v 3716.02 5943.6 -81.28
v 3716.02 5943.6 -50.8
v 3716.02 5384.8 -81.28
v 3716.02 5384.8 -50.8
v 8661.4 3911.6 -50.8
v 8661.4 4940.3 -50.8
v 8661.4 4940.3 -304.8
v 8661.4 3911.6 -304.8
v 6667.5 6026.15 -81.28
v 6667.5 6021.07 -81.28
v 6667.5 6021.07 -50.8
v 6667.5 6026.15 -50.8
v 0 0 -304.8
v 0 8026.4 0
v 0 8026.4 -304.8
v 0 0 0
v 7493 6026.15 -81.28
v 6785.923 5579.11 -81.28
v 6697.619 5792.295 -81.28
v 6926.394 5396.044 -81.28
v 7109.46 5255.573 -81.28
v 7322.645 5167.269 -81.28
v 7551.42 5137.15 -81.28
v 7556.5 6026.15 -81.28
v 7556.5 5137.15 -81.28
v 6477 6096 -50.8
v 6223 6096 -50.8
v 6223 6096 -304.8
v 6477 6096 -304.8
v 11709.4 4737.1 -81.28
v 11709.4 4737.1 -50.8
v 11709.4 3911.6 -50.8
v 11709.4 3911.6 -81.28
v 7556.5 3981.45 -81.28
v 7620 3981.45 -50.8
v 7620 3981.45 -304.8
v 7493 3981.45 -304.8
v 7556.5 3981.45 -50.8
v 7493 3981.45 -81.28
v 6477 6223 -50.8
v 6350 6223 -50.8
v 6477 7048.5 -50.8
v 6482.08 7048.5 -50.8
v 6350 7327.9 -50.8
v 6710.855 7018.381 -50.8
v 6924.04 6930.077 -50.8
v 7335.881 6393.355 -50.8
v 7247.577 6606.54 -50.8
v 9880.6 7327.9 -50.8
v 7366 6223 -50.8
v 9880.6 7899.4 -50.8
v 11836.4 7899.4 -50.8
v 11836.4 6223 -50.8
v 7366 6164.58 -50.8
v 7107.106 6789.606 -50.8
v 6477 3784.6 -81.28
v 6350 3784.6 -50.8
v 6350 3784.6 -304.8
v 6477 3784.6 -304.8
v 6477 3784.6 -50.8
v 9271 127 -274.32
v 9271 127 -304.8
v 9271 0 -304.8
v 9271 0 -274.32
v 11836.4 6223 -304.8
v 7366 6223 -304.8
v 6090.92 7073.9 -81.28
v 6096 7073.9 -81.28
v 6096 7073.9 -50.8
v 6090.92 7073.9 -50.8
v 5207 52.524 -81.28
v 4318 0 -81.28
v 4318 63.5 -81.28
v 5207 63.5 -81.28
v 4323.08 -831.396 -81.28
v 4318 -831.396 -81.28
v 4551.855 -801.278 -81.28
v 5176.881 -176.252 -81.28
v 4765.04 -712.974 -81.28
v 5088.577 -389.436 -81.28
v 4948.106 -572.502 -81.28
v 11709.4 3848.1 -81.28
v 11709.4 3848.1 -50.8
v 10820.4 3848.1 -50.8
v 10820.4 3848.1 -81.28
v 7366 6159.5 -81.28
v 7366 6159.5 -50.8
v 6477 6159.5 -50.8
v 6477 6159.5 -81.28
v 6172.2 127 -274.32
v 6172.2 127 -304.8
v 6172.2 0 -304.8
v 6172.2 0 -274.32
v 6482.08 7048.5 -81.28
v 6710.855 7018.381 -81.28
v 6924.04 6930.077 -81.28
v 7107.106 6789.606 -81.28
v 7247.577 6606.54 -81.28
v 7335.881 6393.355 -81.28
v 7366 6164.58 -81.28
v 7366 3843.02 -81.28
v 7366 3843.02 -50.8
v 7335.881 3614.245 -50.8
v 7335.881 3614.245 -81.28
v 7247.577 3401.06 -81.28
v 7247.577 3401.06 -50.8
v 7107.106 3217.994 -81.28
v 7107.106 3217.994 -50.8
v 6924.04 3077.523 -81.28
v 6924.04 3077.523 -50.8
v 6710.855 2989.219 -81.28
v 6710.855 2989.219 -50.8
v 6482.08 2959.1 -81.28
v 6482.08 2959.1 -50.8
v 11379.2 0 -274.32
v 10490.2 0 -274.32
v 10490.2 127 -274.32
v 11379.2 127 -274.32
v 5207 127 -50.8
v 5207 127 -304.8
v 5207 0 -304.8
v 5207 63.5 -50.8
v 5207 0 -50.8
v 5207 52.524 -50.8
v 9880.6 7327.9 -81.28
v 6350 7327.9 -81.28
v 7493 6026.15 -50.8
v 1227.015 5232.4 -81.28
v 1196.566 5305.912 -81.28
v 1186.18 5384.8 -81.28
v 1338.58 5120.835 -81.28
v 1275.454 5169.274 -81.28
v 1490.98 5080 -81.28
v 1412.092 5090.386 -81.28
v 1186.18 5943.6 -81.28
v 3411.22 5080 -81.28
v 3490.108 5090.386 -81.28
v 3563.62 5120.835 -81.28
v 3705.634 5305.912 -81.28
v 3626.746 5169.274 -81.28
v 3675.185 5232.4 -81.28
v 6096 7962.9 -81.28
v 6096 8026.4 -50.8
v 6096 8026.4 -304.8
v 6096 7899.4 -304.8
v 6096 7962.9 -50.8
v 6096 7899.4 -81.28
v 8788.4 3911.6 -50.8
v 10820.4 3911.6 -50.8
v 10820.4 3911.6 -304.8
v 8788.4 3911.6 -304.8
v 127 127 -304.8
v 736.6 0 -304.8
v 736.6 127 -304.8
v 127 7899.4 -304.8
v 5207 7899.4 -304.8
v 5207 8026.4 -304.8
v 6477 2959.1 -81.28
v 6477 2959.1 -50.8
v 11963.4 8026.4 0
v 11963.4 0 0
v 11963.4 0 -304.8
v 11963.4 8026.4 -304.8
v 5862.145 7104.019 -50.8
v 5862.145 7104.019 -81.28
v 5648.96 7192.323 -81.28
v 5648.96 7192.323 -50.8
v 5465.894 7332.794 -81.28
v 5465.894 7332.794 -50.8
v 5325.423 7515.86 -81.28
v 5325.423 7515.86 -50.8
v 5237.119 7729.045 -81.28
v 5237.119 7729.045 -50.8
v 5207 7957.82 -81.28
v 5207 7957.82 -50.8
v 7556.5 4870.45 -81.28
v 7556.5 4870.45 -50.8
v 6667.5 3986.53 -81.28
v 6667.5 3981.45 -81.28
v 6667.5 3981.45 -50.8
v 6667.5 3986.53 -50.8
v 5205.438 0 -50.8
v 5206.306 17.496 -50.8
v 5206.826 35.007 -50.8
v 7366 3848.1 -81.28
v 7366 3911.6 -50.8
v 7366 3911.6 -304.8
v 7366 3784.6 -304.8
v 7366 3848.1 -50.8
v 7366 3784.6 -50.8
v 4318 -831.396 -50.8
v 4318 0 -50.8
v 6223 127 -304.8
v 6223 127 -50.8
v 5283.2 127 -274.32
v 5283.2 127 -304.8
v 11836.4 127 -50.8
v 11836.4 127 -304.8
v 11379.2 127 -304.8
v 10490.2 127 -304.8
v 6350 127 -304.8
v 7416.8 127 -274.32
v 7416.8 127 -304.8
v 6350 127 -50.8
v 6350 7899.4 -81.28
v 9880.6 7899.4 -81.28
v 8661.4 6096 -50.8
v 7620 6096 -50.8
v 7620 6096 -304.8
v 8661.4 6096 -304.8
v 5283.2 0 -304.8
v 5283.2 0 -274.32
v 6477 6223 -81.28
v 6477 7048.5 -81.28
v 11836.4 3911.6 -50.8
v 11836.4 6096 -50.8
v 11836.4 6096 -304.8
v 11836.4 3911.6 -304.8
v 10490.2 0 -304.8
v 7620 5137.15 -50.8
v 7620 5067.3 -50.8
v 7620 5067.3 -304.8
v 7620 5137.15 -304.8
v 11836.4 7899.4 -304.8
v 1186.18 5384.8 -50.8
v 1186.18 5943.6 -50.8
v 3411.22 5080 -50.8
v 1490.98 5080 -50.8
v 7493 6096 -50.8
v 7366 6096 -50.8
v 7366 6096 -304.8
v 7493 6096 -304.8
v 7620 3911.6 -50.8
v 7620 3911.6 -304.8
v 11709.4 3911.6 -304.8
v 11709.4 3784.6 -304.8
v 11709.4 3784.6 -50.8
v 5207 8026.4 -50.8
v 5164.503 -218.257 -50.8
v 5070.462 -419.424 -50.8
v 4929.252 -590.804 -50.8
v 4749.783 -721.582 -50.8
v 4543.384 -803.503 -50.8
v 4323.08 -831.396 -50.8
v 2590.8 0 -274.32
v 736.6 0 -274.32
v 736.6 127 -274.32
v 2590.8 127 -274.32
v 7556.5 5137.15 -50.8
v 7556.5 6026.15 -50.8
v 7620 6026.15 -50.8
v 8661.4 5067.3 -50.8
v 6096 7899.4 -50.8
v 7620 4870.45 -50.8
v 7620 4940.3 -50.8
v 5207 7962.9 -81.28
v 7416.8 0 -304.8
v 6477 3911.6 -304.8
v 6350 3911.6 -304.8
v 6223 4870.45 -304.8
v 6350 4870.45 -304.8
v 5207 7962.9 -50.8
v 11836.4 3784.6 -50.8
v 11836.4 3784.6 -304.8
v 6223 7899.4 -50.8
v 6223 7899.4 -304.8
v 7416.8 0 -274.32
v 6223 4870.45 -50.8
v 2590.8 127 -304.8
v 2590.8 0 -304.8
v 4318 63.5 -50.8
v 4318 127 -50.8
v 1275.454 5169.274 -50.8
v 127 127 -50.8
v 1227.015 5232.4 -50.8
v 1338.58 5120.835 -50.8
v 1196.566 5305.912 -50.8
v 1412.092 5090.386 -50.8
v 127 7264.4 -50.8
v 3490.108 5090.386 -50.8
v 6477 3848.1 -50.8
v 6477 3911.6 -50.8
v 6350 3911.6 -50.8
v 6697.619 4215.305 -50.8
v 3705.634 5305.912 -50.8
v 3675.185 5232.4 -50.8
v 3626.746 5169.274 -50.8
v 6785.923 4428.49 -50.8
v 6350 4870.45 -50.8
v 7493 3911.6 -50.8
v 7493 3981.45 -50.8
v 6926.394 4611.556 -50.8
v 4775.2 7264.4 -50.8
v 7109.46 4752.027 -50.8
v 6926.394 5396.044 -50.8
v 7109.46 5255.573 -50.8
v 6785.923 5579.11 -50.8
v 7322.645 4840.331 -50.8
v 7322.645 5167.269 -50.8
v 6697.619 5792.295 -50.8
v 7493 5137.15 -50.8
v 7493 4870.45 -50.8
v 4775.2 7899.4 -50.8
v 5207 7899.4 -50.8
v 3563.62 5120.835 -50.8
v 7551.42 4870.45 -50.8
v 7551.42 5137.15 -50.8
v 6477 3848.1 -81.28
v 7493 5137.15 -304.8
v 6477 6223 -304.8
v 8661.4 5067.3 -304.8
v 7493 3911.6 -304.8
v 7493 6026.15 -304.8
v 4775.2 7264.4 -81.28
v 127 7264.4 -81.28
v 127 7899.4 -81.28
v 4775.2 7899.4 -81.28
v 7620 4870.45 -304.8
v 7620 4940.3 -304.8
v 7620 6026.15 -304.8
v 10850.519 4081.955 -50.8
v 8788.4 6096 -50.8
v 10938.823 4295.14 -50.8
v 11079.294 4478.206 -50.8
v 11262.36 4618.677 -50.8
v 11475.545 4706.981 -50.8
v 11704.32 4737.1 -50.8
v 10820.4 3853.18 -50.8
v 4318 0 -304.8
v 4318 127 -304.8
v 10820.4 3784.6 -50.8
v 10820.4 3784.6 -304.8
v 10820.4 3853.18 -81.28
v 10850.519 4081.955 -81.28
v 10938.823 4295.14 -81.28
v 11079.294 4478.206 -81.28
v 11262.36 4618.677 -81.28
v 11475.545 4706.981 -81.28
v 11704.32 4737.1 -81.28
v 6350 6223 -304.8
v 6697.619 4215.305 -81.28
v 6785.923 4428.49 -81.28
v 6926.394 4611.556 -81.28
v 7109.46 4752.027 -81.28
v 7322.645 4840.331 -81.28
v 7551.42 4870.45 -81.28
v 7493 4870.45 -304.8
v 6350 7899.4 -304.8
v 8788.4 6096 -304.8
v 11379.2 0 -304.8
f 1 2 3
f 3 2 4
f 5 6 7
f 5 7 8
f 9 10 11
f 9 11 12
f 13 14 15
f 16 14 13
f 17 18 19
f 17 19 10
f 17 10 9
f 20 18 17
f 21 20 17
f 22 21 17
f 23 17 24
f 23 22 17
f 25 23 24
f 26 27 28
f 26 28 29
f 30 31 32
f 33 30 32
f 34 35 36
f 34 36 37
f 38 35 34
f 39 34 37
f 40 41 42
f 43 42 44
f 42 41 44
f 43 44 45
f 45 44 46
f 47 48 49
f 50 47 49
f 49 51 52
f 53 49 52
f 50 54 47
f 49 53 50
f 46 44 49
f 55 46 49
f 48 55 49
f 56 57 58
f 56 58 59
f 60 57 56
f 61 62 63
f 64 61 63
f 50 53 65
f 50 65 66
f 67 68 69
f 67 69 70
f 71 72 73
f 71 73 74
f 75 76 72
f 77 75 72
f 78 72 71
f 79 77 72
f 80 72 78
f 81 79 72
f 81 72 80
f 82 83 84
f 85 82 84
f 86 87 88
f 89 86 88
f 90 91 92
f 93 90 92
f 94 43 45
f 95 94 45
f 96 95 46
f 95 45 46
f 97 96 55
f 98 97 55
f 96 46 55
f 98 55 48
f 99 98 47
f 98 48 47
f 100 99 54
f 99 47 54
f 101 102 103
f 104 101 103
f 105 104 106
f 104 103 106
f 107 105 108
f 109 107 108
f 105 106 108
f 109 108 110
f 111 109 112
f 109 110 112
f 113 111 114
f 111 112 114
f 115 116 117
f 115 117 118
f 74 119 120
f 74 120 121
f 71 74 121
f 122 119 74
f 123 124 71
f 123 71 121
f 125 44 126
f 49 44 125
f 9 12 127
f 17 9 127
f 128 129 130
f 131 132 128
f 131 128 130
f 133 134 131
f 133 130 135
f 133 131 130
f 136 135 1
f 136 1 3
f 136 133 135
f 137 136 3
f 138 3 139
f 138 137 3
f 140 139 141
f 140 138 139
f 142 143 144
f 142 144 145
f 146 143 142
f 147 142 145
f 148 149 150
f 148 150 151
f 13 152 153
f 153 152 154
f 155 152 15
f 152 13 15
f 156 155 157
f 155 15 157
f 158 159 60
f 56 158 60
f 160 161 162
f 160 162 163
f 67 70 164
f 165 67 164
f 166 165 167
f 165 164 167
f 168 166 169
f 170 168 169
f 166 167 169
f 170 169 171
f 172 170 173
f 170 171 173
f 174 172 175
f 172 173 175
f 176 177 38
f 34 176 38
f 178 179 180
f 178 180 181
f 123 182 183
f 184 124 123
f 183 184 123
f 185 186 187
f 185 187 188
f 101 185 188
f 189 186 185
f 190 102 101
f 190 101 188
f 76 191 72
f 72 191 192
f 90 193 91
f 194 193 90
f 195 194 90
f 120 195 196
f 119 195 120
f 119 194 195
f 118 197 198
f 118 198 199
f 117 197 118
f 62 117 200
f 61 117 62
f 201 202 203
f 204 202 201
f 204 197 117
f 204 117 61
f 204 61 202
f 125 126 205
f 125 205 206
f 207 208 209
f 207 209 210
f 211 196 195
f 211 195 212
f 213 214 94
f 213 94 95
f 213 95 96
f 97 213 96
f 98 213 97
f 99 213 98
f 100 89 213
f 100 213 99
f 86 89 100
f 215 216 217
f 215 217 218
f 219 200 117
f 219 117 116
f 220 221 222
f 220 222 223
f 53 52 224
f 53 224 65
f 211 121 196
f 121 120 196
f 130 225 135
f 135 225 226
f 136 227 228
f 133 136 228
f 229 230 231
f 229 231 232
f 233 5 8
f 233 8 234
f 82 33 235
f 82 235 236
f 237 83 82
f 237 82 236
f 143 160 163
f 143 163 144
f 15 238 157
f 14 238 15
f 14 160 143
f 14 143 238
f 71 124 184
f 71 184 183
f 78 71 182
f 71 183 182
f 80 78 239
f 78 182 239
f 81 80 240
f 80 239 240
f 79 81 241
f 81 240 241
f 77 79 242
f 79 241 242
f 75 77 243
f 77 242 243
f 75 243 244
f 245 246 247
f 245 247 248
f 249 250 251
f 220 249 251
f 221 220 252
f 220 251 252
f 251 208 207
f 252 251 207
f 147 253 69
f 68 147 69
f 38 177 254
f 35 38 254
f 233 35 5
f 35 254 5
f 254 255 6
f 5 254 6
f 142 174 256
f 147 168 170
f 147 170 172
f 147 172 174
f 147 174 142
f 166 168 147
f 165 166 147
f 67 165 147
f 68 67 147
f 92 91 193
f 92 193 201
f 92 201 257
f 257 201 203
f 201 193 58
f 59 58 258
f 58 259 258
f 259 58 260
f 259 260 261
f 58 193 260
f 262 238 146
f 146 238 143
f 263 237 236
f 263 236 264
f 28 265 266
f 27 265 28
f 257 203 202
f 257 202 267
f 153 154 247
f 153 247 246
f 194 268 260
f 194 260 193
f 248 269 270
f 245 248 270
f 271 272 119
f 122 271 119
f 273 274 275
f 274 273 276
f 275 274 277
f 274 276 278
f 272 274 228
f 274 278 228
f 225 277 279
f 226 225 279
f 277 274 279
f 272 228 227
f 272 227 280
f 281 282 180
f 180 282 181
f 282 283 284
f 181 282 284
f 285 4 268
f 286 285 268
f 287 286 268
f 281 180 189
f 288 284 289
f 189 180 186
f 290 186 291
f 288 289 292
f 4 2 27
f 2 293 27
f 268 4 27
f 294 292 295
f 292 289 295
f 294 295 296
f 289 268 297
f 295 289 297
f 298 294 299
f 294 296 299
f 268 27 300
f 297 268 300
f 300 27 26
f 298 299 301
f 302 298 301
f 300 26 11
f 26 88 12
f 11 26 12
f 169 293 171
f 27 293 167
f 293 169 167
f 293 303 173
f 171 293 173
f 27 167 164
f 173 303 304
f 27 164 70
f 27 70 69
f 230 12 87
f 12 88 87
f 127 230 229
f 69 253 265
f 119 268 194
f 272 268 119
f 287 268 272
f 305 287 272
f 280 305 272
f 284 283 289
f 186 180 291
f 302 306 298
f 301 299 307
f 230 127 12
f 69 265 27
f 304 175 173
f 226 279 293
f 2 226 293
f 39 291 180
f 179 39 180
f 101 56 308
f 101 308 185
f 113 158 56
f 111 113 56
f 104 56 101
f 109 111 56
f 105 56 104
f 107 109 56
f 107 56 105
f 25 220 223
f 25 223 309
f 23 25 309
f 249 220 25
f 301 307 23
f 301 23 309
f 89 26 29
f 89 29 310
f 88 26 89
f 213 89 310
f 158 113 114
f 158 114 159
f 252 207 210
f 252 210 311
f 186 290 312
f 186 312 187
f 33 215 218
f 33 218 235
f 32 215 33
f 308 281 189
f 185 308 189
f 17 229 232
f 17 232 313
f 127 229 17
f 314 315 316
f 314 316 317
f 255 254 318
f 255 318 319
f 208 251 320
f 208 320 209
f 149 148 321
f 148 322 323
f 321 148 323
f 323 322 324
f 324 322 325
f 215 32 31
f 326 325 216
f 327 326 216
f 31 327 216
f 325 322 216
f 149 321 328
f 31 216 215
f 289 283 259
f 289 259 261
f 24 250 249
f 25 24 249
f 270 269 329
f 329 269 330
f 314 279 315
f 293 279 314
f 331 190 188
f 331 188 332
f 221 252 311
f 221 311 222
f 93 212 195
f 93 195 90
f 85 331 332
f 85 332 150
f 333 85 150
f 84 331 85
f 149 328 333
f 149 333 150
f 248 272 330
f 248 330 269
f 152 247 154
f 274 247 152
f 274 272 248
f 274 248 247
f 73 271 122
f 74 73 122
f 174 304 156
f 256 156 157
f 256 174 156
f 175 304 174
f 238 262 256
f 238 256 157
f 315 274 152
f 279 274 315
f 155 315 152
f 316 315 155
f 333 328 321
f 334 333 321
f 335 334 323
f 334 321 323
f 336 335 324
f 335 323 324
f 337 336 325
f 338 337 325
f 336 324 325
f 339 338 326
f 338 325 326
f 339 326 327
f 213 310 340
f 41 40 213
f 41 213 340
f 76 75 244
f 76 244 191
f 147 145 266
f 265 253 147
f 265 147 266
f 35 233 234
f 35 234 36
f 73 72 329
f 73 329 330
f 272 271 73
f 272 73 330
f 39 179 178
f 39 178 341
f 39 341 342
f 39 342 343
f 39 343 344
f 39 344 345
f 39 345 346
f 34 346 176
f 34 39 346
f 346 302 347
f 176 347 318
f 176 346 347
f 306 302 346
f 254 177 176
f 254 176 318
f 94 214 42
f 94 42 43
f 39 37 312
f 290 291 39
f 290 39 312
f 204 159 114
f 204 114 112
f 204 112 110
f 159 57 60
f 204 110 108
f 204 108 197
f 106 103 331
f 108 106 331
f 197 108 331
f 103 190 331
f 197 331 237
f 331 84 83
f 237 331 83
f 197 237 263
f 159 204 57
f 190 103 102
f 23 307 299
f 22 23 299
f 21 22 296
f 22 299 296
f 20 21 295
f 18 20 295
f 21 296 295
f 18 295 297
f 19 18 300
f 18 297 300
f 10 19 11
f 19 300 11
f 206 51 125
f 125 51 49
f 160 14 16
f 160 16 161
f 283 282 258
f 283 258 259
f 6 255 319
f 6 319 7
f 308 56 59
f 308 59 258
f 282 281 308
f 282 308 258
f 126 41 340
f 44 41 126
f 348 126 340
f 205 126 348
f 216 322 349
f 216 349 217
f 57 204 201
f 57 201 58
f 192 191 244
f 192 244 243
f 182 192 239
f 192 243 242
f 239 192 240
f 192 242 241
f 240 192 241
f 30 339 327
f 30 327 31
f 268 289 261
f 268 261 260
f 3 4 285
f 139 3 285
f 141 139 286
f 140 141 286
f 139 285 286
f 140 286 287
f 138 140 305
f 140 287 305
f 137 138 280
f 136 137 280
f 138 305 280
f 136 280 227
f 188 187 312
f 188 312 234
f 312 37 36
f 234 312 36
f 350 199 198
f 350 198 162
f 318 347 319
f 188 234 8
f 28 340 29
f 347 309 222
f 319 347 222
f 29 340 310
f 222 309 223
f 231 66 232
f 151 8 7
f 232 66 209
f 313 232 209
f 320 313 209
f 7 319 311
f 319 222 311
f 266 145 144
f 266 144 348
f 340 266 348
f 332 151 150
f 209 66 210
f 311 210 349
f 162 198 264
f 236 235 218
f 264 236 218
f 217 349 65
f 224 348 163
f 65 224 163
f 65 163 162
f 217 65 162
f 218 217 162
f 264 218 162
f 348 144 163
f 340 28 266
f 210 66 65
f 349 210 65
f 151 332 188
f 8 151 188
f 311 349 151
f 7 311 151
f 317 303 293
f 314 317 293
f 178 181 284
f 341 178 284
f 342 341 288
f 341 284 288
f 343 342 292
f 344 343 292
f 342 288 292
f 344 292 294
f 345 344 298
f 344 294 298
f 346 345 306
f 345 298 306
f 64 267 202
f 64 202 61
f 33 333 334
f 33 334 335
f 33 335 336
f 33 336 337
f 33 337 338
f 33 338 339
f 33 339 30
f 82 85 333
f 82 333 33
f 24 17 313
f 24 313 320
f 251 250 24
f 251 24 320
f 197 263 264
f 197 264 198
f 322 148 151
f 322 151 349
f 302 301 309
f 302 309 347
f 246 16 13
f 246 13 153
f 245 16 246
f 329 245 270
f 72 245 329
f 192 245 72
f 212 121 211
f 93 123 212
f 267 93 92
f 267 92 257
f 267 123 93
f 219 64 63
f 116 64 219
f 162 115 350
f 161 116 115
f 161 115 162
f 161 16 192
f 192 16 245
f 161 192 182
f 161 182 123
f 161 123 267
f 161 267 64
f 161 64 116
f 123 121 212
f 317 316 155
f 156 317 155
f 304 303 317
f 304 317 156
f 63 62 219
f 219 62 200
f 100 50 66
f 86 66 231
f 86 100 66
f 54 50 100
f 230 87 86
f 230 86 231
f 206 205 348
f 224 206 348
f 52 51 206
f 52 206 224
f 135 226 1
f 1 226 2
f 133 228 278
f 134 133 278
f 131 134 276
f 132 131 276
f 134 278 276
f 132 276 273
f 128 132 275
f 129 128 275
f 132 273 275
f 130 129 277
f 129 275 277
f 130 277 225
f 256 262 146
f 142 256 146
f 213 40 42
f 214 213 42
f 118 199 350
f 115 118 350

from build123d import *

# Parameters (mm, degrees)
F1_DEPTH = 304.8
F2_W     = 11963.4
F2_H     = 8026.4
F3_DEPTH = 50.8
F4_W     = 889
F4_H     = 127
F4_W_2   = 1854.2
F5_DEPTH = 30.48
F6_W     = 4648.2
F6_H     = 635
F6_W_2   = 3530.6
F6_H_2   = 571.5
F7_DEPTH = 30.48


with BuildPart() as f1:
    # F0 (on Top) → F1 (new body)
    with BuildSketch(Plane.XY):
        Polygon((4318, 127), (127, 127), (127, 7899.4), (5207, 7899.4), (5207, 8026.4), (0, 8026.4), (0, 0), (4318, 0), align=None)
        Polygon((11963.4, 8026.4), (6096, 8026.4), (6096, 7899.4), (6223, 7899.4), (6223, 6096), (6477, 6096), (6477, 6223), (6350, 6223), (6350, 7899.4), (11836.4, 7899.4), (11836.4, 6223), (7366, 6223), (7366, 6096), (7493, 6096), (7493, 6026.15), (7620, 6026.15), (7620, 6096), (8661.4, 6096), (8661.4, 5067.3), (7620, 5067.3), (7620, 5137.15), (7493, 5137.15), (7493, 4870.45), (7620, 4870.45), (7620, 4940.3), (8661.4, 4940.3), (8661.4, 3911.6), (7620, 3911.6), (7620, 3981.45), (7493, 3981.45), (7493, 3911.6), (7366, 3911.6), (7366, 3784.6), (10820.4, 3784.6), (10820.4, 3911.6), (8788.4, 3911.6), (8788.4, 6096), (11836.4, 6096), (11836.4, 3911.6), (11709.4, 3911.6), (11709.4, 3784.6), (11836.4, 3784.6), (11836.4, 127), (6350, 127), (6350, 3784.6), (6477, 3784.6), (6477, 3911.6), (6350, 3911.6), (6350, 4870.45), (6223, 4870.45), (6223, 127), (5207, 127), (5207, 0), (11963.4, 0), align=None)
    extrude(amount=-F1_DEPTH)

    # F2 (on face) → F3 (join)
    with BuildSketch(Plane.XY):
        with Locations((5981.7, 4013.2)):
            Rectangle(F2_W, F2_H)
    extrude(amount=-F3_DEPTH)

    # F4 (on face) → F5 (cut)
    with BuildSketch(Plane(origin=(0, 0, -304.8), x_dir=(1, 0, 0), z_dir=(0, 0, -1))):
        with Locations((5727.7, -63.5)):
            Rectangle(F4_W, F4_H)
        with Locations((8343.9, -63.5)):
            Rectangle(F4_W_2, F4_H)
        with Locations((10934.7, -63.5)):
            Rectangle(F4_W, F4_H)
        with Locations((1663.7, -63.5)):
            Rectangle(F4_W_2, F4_H)
    extrude(amount=-F5_DEPTH, mode=Mode.SUBTRACT)

    # F6 (on face) → F7 (join)
    with BuildSketch(Plane(origin=(0, 0, -50.8), x_dir=(1, 0, 0), z_dir=(0, 0, -1))):
        with BuildLine():
            ThreePointArc((3716.02, -5384.8), (3626.746147, -5169.273853), (3411.22, -5080))
            Line((3411.22, -5080), (1490.98, -5080))
            ThreePointArc((1490.98, -5080), (1275.453853, -5169.273853), (1186.18, -5384.8))
            Line((1186.18, -5384.8), (1186.18, -5943.6))
            Line((1186.18, -5943.6), (3716.02, -5943.6))
            Line((3716.02, -5943.6), (3716.02, -5384.8))
        make_face()
        with Locations((2451.1, -7581.9)):
            Rectangle(F6_W, F6_H)
        with Locations((8115.3, -7613.65)):
            Rectangle(F6_W_2, F6_H_2)
        with BuildLine():
            Line((4318, 831.39637), (4318, -63.5))
            Line((4318, -63.5), (5207, -63.5))
            Line((5207, -63.5), (5207, -52.52363))
            ThreePointArc((5207, -52.52363), (4948.105826, 572.502196), (4323.08, 831.39637))
            Line((4323.08, 831.39637), (4318, 831.39637))
        make_face()
        with BuildLine():
            Line((6477, -2959.1), (6477, -3848.1))
            Line((6477, -3848.1), (7366, -3848.1))
            Line((7366, -3848.1), (7366, -3843.02))
            ThreePointArc((7366, -3843.02), (7107.105826, -3217.994174), (6482.08, -2959.1))
            Line((6482.08, -2959.1), (6477, -2959.1))
        make_face()
        with BuildLine():
            Line((6667.5, -6026.15), (7556.5, -6026.15))
            Line((7556.5, -6026.15), (7556.5, -5137.15))
            Line((7556.5, -5137.15), (7551.42, -5137.15))
            ThreePointArc((7551.42, -5137.15), (6926.394174, -5396.044174), (6667.5, -6021.07))
            Line((6667.5, -6021.07), (6667.5, -6026.15))
        make_face()
        with BuildLine():
            Line((7556.5, -4870.45), (7556.5, -3981.45))
            Line((7556.5, -3981.45), (6667.5, -3981.45))
            Line((6667.5, -3981.45), (6667.5, -3986.53))
            ThreePointArc((6667.5, -3986.53), (6926.394174, -4611.555826), (7551.42, -4870.45))
            Line((7551.42, -4870.45), (7556.5, -4870.45))
        make_face()
        with BuildLine():
            Line((7366, -6159.5), (6477, -6159.5))
            Line((6477, -6159.5), (6477, -7048.5))
            Line((6477, -7048.5), (6482.08, -7048.5))
            ThreePointArc((6482.08, -7048.5), (7107.105826, -6789.605826), (7366, -6164.58))
            Line((7366, -6164.58), (7366, -6159.5))
        make_face()
        with BuildLine():
            Line((11709.4, -4737.1), (11709.4, -3848.1))
            Line((11709.4, -3848.1), (10820.4, -3848.1))
            Line((10820.4, -3848.1), (10820.4, -3853.18))
            ThreePointArc((10820.4, -3853.18), (11079.294174, -4478.205826), (11704.32, -4737.1))
            Line((11704.32, -4737.1), (11709.4, -4737.1))
        make_face()
        with BuildLine():
            Line((5207, -7957.82), (5207, -7962.9))
            Line((5207, -7962.9), (6096, -7962.9))
            Line((6096, -7962.9), (6096, -7073.9))
            Line((6096, -7073.9), (6090.92, -7073.9))
            ThreePointArc((6090.92, -7073.9), (5465.894174, -7332.794174), (5207, -7957.82))
        make_face()
    extrude(amount=F7_DEPTH)


solid = f1.part
